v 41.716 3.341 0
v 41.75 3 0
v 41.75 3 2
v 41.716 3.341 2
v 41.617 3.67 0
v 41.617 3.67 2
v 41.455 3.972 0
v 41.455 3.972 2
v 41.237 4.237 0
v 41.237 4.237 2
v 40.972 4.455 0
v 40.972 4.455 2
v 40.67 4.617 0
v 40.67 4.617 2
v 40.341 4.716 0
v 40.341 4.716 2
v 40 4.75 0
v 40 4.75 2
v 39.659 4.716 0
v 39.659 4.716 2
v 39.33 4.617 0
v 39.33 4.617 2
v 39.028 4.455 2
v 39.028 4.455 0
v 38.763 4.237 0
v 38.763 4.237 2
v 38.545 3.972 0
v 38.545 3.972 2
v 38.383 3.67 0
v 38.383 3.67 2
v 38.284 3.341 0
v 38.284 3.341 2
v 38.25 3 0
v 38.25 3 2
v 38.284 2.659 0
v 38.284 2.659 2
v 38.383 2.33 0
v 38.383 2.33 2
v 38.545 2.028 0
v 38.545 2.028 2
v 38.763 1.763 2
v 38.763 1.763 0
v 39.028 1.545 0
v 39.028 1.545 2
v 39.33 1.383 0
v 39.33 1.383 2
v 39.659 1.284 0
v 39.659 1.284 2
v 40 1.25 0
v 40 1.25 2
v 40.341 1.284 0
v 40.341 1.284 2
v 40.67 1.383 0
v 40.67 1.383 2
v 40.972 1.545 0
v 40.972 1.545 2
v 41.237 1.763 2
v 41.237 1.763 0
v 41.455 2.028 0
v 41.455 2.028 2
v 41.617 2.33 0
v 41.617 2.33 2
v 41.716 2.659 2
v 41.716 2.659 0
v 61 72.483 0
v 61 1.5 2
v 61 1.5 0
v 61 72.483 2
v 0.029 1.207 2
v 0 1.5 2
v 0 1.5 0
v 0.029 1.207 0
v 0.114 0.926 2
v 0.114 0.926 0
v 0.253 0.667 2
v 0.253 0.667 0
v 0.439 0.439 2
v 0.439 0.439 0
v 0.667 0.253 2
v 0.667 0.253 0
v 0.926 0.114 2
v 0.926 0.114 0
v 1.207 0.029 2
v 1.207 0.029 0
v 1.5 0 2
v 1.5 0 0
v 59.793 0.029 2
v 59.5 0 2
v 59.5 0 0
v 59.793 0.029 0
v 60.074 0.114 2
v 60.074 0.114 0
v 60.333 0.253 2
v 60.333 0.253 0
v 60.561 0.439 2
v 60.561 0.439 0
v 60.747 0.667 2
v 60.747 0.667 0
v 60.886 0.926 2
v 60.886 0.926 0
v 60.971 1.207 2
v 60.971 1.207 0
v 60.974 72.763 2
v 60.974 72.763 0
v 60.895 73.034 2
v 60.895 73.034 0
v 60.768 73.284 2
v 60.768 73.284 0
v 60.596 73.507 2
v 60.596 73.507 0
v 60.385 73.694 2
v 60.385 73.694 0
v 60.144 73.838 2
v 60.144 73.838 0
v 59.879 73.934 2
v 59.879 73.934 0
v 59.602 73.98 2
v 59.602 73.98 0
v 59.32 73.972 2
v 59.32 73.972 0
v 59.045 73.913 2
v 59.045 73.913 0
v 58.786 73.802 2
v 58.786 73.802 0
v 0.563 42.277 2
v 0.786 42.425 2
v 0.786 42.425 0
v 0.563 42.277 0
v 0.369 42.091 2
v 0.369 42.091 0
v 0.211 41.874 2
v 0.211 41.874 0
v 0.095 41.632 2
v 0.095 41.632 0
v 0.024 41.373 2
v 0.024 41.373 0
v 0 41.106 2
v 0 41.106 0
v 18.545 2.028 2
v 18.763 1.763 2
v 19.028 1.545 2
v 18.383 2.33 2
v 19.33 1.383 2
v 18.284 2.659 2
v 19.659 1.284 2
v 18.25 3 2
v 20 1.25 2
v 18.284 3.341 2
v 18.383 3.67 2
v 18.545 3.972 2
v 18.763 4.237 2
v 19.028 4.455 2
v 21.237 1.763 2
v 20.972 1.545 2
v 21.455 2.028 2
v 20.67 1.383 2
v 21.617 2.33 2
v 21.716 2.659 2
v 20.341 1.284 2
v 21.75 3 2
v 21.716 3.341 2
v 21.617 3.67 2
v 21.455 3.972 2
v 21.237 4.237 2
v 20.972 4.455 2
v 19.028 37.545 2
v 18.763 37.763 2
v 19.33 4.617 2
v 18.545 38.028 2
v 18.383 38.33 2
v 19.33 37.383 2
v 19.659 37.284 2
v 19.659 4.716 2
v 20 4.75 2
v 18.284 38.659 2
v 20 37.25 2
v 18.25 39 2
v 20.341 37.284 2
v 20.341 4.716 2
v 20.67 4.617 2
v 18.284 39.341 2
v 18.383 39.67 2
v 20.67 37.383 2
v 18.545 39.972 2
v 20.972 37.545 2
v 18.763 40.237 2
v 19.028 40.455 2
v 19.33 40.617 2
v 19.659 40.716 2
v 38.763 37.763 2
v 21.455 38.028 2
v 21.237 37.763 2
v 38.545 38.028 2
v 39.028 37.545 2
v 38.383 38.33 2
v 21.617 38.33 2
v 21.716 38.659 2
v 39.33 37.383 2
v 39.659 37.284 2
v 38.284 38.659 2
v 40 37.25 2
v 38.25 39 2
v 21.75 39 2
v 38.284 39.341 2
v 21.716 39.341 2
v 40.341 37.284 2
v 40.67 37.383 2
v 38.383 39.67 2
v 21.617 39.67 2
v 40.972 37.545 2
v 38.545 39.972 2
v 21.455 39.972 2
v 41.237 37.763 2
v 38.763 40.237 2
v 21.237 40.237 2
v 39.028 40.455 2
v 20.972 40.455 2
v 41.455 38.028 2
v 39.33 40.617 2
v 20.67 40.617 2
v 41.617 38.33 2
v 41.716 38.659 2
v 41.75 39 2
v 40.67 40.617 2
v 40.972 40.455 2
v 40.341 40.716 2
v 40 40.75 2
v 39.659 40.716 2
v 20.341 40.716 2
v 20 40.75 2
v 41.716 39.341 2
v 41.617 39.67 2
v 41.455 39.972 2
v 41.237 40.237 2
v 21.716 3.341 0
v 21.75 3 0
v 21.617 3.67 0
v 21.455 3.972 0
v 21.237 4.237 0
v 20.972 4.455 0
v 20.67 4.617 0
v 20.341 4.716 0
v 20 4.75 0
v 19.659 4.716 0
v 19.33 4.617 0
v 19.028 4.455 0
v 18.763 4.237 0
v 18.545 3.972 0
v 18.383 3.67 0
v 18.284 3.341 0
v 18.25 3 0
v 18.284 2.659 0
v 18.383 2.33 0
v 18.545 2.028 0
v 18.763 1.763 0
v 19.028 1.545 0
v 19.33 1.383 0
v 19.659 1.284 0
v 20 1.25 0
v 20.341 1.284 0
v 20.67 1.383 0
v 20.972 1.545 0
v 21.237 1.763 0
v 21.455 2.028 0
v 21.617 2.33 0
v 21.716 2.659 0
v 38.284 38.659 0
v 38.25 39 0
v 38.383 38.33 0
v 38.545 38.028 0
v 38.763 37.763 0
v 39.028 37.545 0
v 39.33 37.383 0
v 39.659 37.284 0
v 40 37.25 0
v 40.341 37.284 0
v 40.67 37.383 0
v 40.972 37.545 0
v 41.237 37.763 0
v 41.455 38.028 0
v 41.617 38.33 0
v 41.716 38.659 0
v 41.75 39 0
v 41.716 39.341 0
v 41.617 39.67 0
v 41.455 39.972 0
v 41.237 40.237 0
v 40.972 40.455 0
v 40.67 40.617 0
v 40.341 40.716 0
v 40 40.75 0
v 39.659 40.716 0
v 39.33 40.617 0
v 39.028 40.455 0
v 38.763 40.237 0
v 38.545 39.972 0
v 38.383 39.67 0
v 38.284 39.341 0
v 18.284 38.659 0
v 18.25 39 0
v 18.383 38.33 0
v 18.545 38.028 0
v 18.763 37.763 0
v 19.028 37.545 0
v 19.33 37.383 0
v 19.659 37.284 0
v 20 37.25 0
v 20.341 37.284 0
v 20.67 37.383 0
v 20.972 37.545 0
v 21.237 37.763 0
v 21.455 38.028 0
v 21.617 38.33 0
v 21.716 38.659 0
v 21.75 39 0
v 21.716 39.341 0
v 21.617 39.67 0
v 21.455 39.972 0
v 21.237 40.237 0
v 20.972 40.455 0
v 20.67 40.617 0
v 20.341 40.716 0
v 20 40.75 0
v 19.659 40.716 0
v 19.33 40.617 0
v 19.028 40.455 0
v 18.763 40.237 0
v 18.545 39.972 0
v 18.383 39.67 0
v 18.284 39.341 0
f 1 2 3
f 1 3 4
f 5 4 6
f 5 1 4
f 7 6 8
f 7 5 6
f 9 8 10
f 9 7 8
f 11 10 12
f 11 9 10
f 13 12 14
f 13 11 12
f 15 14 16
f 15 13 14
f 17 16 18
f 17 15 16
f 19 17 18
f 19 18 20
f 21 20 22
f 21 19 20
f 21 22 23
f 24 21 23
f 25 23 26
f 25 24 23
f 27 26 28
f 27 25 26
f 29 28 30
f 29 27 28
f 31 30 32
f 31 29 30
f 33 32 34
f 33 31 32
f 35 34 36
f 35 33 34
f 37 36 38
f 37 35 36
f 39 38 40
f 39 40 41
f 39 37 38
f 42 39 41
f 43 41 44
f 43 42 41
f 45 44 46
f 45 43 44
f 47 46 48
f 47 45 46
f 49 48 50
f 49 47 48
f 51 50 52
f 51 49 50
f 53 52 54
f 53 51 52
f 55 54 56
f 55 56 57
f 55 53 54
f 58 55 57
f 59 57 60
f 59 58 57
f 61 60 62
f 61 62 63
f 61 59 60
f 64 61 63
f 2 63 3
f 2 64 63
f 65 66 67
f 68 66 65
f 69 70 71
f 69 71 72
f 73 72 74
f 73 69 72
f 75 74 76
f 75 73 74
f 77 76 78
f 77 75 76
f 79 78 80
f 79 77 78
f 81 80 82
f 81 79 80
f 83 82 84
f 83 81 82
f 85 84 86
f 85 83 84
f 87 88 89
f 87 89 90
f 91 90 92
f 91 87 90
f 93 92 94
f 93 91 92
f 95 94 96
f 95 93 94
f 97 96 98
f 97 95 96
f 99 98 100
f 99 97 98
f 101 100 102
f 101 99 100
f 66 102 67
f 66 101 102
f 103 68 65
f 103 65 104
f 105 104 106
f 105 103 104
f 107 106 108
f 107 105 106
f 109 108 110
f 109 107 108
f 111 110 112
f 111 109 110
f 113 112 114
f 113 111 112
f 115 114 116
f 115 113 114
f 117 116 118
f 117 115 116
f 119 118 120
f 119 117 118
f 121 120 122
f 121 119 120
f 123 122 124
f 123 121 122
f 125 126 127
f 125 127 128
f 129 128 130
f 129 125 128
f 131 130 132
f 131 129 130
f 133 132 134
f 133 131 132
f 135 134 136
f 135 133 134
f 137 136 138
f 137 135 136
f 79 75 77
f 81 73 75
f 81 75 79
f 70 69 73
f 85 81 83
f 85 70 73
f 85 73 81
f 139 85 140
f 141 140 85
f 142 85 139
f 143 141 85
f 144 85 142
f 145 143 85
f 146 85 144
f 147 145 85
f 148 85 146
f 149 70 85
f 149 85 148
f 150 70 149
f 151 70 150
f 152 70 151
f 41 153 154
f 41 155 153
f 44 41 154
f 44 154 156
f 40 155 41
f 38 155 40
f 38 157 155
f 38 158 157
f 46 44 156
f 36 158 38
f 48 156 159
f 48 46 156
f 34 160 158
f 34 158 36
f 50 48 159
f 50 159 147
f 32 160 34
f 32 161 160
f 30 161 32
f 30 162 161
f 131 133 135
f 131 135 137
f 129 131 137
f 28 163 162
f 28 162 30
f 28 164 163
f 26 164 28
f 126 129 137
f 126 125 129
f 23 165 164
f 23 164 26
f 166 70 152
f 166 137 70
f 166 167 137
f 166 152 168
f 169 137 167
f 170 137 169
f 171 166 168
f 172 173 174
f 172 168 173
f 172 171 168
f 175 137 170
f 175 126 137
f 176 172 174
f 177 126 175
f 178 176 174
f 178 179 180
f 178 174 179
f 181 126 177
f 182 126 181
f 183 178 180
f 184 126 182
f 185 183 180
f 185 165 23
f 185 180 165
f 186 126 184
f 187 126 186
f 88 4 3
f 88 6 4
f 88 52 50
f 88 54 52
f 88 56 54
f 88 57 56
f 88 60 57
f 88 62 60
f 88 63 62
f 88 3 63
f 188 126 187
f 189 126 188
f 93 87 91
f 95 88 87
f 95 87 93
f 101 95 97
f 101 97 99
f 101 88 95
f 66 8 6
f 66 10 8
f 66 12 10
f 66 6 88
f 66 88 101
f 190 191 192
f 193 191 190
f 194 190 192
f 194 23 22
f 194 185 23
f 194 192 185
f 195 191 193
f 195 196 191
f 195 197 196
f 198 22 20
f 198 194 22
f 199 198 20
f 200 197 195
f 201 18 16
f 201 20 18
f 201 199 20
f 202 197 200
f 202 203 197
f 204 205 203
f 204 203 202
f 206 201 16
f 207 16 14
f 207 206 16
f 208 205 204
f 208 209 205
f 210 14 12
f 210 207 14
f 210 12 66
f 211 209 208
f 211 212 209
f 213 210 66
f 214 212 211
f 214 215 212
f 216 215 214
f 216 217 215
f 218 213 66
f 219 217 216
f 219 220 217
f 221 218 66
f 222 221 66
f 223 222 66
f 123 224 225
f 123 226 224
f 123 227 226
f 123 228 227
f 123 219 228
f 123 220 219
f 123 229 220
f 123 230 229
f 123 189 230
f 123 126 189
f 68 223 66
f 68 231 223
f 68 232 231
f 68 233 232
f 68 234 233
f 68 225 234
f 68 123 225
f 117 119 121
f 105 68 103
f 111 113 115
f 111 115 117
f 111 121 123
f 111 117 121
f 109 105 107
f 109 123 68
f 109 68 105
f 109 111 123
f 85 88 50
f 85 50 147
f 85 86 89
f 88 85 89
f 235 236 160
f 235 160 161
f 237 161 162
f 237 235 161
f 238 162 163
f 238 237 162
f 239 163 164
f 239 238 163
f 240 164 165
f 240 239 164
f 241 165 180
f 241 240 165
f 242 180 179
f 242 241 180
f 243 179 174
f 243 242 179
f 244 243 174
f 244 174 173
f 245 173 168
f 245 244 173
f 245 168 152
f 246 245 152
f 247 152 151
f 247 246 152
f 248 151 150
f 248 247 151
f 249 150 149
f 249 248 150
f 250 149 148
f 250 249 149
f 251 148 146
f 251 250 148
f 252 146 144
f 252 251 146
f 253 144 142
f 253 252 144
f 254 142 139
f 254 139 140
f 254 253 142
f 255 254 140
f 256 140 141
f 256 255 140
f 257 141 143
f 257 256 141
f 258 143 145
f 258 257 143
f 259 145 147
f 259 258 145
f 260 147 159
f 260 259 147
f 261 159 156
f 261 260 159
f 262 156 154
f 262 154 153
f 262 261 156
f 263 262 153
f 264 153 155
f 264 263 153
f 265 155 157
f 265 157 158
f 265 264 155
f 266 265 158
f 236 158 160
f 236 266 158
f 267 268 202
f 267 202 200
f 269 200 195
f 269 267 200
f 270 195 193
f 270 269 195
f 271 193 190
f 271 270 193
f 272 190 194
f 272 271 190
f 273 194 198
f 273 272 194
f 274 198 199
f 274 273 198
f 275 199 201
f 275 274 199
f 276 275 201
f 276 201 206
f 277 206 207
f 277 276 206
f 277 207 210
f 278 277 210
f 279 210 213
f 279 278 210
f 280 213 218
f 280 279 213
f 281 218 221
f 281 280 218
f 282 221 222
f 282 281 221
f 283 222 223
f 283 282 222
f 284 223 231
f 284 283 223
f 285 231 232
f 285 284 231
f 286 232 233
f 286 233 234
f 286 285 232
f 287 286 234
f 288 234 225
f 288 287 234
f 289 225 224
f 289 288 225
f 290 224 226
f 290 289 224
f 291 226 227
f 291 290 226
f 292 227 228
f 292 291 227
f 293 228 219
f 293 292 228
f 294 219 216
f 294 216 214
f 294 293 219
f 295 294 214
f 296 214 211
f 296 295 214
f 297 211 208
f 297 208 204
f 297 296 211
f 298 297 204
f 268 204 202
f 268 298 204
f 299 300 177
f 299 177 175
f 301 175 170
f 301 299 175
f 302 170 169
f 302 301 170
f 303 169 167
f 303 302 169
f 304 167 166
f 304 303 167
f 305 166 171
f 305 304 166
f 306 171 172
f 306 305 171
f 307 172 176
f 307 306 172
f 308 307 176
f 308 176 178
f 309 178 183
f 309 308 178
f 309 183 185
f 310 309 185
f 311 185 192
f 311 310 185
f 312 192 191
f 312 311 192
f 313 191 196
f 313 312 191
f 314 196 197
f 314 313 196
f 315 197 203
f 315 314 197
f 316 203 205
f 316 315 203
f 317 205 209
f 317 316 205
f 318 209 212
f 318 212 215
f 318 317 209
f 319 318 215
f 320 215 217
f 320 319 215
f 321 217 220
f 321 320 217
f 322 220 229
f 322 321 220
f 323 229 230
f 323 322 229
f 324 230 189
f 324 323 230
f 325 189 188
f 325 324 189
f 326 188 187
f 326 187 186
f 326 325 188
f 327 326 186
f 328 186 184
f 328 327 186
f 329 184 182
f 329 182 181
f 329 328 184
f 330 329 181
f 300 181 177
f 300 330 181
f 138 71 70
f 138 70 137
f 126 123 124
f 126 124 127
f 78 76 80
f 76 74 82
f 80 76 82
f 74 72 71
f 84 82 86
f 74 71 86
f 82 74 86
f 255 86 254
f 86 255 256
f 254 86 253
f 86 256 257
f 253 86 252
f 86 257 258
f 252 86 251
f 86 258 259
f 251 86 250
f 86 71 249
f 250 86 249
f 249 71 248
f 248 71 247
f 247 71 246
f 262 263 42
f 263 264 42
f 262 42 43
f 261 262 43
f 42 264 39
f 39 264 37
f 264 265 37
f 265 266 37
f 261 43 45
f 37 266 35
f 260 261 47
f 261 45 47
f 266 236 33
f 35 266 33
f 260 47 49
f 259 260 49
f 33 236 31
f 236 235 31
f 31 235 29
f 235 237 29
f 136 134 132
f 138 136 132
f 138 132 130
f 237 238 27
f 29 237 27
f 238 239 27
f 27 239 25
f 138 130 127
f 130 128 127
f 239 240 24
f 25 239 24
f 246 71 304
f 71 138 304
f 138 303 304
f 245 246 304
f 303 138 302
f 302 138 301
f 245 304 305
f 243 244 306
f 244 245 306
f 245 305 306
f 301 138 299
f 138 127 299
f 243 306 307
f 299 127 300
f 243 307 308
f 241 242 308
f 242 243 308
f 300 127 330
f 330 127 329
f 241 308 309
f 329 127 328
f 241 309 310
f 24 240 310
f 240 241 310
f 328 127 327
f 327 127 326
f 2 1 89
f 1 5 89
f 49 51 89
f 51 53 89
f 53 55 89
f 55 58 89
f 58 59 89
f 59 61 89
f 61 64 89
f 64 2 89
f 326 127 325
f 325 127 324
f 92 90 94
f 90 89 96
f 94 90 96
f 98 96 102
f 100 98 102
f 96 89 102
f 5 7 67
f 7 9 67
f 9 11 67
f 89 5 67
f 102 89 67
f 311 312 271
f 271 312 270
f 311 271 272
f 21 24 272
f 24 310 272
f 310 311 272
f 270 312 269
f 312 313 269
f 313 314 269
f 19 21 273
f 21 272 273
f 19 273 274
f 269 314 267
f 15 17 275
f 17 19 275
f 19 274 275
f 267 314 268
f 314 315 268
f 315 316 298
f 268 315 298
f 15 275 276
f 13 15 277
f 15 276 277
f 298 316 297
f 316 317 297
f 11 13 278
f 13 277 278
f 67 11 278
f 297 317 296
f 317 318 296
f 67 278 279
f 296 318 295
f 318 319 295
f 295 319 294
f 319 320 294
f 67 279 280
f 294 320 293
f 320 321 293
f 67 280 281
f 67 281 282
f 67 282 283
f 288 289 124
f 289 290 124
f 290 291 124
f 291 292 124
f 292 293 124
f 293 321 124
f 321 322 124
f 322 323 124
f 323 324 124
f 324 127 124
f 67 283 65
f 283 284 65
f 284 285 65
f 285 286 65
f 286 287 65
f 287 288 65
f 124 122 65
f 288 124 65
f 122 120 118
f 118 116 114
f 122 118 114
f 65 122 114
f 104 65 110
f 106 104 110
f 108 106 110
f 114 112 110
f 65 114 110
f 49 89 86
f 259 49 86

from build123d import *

# Parameters (mm, degrees)
SKETCH_1_W          = 61
SKETCH_1_H          = 42
SKETCH_1_R          = 1.75
EXTRUDE_1_DEPTH     = 2
EXTRUDE_2_DEPTH     = 2
SKETCH_3_OUTSIDE_W  = 82.34
SKETCH_3_OUTSIDE_H  = 96.34
CUT_EXTRUDE_1_DEPTH = 10


with BuildPart() as part:
    # 草图1 → 凸台-拉伸1 (new body)
    with BuildSketch(Plane.XY):
        with Locations((30.5, 21)):
            Rectangle(SKETCH_1_W, SKETCH_1_H)
        with Locations((20, 3)):
            Circle(SKETCH_1_R, mode=Mode.SUBTRACT)
        with Locations((40, 3)):
            Circle(SKETCH_1_R, mode=Mode.SUBTRACT)
        with Locations(Location((40, 39, 0), (0, 0, 180))):
            Circle(SKETCH_1_R, mode=Mode.SUBTRACT)
        with Locations(Location((20, 39, 0), (0, 0, 180))):
            Circle(SKETCH_1_R, mode=Mode.SUBTRACT)
    extrude(amount=EXTRUDE_1_DEPTH)

    # 草图2 → 凸台-拉伸2 (add)
    with BuildSketch(Plane.XY.offset(2)):
        Polygon((61, 75), (0, 42), (61, 42), align=None)
    extrude(amount=-EXTRUDE_2_DEPTH)

    # 草图3 outside → 切除-拉伸1 (cut)
    with BuildSketch(Plane.XY.offset(2)):
        with Locations((30.5, 37.5)):
            Rectangle(SKETCH_3_OUTSIDE_W, SKETCH_3_OUTSIDE_H)
        with BuildLine():
            Line((0, 41.106045159), (0, 1.5))
            ThreePointArc((0, 1.5), (0.439339828, 0.439339828), (1.5, 0))
            Line((1.5, 0), (59.5, 0))
            ThreePointArc((59.5, 0), (60.560660172, 0.439339828), (61, 1.5))
            Line((61, 1.5), (61, 72.483094339))
            ThreePointArc((61, 72.483094339), (60.26792193, 73.771619042), (58.786272122, 73.802409508))
            Line((58.786272122, 73.802409508), (0.786272122, 42.425360328))
            ThreePointArc((0.786272122, 42.425360328), (0.211475298, 41.873967089), (0, 41.106045159))
        make_face(mode=Mode.SUBTRACT)
    extrude(amount=-CUT_EXTRUDE_1_DEPTH, mode=Mode.SUBTRACT)


solid = part.part
